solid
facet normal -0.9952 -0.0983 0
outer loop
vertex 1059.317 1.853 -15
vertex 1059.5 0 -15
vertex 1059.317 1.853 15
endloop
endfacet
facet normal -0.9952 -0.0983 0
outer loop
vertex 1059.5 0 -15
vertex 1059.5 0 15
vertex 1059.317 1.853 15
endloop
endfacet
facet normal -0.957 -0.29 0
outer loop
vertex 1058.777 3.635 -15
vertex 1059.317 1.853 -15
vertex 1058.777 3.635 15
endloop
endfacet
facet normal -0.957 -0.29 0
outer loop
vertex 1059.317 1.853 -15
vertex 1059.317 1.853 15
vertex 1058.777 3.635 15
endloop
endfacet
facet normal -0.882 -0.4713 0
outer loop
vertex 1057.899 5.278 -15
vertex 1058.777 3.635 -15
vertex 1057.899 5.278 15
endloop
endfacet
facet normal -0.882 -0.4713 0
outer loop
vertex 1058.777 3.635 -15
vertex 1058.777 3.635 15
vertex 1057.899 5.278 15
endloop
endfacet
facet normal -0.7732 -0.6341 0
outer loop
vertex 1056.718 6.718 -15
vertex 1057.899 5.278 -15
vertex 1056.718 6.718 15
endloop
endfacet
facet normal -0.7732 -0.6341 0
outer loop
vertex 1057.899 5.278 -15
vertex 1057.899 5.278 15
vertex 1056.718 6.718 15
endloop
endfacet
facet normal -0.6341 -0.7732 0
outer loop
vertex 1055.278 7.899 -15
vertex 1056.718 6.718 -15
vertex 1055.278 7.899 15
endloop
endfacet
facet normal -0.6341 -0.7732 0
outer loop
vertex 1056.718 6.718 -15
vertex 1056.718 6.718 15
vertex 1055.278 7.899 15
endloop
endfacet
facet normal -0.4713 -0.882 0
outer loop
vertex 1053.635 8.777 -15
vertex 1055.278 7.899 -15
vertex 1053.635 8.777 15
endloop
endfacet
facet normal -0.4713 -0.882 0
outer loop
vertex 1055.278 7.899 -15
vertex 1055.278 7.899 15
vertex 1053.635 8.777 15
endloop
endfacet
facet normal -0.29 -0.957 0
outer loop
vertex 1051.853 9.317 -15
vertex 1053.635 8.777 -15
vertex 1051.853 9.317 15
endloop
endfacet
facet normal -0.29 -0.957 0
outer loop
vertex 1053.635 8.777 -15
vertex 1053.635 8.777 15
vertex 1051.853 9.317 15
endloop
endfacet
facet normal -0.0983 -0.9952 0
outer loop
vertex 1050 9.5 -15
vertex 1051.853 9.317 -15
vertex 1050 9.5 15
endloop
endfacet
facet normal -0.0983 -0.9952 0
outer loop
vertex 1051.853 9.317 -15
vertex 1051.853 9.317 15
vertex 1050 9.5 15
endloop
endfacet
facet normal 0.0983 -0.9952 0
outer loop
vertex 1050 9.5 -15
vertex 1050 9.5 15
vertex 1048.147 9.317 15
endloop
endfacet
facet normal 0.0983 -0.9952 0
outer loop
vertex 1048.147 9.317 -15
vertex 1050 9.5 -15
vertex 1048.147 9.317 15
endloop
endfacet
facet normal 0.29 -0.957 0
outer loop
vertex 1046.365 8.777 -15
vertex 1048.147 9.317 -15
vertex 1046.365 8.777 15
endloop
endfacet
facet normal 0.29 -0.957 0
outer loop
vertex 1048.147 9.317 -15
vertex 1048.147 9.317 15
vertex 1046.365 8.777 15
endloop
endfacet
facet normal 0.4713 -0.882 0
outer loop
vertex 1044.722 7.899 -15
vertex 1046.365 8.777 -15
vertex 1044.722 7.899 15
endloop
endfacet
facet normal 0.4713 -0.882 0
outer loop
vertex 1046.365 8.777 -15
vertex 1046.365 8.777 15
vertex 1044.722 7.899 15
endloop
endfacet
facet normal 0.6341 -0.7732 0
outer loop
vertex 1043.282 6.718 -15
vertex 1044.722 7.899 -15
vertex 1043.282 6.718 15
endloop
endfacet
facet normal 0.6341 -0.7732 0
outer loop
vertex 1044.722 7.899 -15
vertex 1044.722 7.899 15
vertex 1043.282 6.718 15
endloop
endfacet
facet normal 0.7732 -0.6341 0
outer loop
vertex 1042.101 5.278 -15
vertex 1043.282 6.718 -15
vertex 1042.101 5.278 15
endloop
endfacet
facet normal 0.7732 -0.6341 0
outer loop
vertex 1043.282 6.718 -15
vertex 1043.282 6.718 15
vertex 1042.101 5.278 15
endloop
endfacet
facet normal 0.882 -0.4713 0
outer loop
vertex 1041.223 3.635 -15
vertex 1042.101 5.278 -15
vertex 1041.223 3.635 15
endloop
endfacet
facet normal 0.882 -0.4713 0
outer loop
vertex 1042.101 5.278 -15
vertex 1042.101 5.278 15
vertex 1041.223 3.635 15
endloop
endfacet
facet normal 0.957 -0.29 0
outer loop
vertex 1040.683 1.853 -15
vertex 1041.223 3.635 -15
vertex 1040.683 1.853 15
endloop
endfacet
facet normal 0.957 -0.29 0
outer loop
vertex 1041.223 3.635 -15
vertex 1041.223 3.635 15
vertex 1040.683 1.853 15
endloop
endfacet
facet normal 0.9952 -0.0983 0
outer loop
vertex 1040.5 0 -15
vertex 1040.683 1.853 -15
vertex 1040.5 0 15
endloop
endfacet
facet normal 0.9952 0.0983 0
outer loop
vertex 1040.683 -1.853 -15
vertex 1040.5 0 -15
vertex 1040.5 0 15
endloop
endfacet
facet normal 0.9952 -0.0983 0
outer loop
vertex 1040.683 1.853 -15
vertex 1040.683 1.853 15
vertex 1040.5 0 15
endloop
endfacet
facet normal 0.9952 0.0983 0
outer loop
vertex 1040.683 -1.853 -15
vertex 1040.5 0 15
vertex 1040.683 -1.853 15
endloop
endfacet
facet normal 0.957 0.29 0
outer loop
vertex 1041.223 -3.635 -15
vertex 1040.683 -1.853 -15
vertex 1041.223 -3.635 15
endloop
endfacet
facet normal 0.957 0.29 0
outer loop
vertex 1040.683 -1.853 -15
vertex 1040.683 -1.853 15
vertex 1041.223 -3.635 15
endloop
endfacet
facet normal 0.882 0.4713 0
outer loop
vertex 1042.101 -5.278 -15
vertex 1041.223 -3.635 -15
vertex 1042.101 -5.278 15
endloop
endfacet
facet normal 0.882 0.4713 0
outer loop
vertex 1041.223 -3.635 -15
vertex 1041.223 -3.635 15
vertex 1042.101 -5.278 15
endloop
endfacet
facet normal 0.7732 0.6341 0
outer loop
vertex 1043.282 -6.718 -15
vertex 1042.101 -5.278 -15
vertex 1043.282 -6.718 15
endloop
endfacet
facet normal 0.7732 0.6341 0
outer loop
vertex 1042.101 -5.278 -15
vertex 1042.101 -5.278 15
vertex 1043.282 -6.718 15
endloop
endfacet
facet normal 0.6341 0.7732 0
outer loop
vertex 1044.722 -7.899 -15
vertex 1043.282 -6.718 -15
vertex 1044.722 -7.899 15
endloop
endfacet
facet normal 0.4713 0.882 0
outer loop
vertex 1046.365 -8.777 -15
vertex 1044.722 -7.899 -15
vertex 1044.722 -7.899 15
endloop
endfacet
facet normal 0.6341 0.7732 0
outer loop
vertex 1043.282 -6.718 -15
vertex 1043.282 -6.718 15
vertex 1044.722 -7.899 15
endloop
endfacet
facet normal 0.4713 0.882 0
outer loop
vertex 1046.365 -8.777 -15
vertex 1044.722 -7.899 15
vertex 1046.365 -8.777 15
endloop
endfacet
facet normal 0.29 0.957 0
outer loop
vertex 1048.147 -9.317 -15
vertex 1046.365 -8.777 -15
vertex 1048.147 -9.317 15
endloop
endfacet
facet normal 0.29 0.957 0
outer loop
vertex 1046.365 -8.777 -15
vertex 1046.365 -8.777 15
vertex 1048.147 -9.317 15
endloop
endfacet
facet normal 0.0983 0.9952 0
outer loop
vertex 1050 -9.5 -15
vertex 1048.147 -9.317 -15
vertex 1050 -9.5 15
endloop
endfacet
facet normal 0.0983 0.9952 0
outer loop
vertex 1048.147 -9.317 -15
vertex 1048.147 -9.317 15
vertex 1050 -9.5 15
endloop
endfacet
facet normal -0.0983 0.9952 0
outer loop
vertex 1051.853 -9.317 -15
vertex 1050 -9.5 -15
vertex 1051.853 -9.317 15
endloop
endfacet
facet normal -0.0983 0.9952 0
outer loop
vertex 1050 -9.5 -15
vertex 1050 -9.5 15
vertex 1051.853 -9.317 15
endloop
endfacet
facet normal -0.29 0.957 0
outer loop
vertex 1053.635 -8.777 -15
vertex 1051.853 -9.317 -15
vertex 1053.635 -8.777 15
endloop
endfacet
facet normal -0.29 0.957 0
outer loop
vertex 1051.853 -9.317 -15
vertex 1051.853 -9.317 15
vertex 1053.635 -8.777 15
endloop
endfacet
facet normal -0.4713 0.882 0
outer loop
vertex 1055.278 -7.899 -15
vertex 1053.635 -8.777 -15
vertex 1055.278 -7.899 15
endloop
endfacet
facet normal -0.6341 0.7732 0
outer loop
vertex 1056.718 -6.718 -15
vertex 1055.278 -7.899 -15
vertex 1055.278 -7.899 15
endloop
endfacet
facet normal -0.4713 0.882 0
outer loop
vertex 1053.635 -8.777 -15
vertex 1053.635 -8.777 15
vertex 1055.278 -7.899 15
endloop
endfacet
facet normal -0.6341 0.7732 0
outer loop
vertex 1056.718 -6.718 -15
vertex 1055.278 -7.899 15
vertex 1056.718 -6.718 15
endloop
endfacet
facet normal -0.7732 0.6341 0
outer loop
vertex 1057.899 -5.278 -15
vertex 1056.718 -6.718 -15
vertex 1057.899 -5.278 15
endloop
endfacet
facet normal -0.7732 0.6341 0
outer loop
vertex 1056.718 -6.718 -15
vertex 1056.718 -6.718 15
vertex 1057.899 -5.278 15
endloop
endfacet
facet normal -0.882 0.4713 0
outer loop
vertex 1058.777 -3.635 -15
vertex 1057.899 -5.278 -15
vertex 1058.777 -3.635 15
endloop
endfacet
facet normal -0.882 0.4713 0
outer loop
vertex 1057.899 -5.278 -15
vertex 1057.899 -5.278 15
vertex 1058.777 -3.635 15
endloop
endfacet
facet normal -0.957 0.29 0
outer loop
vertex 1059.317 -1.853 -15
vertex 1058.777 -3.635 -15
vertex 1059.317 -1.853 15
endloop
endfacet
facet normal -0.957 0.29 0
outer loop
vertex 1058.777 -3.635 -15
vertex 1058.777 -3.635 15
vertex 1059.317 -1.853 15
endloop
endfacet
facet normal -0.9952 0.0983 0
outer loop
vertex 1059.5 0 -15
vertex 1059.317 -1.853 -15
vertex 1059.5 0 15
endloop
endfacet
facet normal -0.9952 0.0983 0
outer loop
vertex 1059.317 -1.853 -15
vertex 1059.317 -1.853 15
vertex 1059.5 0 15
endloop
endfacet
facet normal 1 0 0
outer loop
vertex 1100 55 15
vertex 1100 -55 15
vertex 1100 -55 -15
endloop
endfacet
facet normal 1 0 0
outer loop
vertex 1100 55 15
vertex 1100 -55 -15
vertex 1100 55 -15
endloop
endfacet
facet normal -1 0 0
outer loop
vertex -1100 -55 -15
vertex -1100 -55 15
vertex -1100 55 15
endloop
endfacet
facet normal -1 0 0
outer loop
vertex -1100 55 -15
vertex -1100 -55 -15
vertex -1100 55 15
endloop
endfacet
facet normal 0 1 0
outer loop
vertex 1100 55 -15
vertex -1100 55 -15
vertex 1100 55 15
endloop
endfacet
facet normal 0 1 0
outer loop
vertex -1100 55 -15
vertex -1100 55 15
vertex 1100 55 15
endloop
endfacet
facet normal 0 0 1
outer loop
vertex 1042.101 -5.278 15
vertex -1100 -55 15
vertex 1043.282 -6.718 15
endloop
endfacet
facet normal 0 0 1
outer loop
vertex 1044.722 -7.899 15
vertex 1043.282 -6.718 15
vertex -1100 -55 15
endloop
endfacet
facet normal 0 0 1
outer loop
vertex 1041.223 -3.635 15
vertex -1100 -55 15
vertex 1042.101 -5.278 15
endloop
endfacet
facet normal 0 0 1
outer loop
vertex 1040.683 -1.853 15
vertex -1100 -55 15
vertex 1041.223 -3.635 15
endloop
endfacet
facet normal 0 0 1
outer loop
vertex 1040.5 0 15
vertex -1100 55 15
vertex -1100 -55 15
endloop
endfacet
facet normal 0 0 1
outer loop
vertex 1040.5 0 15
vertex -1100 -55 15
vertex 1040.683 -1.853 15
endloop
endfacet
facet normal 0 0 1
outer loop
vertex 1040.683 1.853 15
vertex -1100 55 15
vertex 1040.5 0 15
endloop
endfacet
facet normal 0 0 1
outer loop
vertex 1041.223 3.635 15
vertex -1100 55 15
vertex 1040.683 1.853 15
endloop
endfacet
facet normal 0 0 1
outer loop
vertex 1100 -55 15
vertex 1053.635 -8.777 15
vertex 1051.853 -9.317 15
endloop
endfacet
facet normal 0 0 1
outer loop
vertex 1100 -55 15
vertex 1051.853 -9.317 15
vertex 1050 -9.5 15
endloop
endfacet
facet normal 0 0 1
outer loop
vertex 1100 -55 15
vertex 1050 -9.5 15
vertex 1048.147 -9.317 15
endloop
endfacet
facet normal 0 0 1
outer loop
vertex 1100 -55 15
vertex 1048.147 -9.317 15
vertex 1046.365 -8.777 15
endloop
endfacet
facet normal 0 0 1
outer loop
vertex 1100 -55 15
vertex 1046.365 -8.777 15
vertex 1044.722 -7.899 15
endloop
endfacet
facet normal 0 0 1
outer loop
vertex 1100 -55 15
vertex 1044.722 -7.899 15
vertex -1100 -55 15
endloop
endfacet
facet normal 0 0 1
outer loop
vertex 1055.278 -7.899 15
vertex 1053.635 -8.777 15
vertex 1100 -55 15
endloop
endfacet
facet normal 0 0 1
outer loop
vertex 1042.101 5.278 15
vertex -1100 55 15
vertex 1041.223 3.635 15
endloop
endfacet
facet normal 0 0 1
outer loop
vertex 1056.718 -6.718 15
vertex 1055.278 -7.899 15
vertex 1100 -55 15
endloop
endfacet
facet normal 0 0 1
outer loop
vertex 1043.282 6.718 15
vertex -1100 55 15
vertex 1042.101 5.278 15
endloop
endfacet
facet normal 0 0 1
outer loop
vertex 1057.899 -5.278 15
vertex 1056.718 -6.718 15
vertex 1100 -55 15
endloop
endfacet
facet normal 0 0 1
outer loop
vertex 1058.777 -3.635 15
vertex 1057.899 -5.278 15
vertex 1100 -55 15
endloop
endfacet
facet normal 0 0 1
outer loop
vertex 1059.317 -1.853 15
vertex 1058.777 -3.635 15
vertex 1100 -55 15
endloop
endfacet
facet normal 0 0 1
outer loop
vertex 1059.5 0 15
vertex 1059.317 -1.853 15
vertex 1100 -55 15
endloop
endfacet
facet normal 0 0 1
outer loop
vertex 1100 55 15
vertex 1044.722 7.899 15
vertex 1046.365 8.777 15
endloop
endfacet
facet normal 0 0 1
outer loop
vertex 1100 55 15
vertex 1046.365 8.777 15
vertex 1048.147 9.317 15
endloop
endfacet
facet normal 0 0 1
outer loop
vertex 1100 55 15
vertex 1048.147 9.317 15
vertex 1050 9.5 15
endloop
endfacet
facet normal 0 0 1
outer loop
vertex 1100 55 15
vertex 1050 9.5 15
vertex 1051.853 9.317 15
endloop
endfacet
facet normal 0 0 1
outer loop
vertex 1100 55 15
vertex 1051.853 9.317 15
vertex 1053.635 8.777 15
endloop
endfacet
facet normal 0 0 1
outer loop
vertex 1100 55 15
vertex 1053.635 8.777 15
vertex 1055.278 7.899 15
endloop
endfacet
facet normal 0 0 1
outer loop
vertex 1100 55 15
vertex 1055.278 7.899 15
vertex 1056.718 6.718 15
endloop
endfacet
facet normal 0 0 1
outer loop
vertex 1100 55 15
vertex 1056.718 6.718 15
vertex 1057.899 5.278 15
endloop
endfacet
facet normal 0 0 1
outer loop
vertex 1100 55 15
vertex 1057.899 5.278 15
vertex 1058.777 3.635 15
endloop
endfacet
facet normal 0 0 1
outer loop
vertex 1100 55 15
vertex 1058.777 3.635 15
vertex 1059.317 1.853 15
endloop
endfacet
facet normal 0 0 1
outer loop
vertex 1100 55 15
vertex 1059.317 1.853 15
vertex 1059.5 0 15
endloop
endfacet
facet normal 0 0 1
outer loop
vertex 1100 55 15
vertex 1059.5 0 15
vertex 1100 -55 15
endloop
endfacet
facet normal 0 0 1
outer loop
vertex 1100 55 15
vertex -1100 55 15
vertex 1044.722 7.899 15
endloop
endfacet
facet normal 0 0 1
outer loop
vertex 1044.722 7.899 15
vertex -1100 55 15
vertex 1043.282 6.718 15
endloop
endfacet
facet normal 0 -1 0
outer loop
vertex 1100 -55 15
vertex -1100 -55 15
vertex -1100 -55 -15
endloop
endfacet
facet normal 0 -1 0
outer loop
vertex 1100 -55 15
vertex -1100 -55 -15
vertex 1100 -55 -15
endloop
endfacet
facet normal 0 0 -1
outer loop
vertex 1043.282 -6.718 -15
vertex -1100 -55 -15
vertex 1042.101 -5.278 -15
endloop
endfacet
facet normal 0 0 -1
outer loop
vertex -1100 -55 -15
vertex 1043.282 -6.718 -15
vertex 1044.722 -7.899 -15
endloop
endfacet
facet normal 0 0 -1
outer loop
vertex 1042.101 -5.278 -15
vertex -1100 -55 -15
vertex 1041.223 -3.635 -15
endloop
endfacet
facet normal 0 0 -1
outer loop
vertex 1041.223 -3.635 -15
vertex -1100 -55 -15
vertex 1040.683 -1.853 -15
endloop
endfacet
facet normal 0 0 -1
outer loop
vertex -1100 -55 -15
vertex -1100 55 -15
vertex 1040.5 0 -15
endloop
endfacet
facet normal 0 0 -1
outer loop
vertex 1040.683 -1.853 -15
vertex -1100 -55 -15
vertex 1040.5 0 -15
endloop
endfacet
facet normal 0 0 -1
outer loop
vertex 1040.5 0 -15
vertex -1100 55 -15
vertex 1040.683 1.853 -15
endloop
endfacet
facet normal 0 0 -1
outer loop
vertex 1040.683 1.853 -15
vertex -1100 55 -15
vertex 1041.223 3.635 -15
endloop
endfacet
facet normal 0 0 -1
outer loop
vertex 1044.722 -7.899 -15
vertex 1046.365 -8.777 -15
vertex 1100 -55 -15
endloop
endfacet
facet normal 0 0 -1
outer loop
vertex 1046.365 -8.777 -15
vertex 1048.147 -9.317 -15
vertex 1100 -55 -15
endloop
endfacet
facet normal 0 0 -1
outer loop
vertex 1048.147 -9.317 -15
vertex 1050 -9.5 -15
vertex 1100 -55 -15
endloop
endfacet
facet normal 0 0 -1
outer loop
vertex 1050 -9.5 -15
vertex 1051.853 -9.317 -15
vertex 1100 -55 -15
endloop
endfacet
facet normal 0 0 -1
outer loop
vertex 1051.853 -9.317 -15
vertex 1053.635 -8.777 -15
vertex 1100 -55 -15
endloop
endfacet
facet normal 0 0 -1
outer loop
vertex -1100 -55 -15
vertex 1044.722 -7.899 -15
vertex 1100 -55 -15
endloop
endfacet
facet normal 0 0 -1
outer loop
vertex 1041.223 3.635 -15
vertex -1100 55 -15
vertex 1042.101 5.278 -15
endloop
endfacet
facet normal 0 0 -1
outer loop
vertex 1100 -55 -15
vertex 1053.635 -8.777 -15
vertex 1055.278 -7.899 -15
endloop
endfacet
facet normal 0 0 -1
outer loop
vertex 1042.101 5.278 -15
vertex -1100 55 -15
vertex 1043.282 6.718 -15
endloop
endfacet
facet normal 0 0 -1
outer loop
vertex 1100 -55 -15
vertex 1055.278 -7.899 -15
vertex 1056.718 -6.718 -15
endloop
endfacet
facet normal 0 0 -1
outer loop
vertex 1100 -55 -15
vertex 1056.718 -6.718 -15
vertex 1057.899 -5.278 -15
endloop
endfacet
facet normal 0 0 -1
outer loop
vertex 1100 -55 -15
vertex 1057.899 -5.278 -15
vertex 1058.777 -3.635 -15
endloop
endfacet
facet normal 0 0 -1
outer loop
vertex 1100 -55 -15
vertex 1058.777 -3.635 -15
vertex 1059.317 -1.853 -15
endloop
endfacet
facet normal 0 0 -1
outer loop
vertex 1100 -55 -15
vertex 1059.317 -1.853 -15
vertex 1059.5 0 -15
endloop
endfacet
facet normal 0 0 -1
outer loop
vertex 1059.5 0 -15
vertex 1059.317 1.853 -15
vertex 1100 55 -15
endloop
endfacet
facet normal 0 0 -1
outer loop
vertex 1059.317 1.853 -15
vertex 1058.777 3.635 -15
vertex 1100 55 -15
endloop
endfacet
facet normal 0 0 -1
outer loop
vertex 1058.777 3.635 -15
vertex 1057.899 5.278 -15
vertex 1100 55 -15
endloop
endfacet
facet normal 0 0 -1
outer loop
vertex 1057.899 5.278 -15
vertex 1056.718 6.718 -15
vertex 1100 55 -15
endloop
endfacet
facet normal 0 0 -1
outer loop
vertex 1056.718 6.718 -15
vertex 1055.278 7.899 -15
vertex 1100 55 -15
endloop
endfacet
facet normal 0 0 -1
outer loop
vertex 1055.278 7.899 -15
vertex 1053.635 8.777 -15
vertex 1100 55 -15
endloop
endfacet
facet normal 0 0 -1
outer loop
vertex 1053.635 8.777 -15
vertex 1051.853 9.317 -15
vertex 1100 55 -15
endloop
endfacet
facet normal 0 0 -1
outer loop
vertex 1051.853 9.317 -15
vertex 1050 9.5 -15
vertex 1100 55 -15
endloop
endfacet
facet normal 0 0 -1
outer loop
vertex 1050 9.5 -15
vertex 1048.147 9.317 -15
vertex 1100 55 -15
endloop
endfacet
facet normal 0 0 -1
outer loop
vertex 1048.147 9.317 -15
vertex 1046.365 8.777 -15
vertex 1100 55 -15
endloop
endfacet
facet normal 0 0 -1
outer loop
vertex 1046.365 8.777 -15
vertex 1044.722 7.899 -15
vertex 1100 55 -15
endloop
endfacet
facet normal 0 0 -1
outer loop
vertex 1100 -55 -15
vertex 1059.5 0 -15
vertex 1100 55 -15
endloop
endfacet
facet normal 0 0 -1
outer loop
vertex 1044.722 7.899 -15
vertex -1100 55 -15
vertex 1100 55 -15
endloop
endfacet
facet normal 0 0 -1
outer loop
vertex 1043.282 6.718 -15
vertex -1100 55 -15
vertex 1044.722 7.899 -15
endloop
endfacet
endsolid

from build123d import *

# Parameters (mm, degrees)
SKETCH_W          = 2200
SKETCH_H          = 110
PAD_DEPTH         = 15
SKETCH001_R       = 9.5
POCKET_DEPTH      = 15.001
POCKET_DEPTH_BACK = -15.001


with BuildPart() as part:
    # Sketch → Pad (new body, symmetric)
    with BuildSketch(Plane.XY):
        Rectangle(SKETCH_W, SKETCH_H)
    extrude(amount=PAD_DEPTH, both=True)

    # Sketch001 → Pocket (cut, two sides)
    with BuildSketch(Plane.XY) as pocket_sk:
        with Locations((1050, 0)):
            Circle(SKETCH001_R)
    extrude(amount=-POCKET_DEPTH, mode=Mode.SUBTRACT)
    extrude(pocket_sk.sketch, amount=-POCKET_DEPTH_BACK, mode=Mode.SUBTRACT)


solid = part.part
